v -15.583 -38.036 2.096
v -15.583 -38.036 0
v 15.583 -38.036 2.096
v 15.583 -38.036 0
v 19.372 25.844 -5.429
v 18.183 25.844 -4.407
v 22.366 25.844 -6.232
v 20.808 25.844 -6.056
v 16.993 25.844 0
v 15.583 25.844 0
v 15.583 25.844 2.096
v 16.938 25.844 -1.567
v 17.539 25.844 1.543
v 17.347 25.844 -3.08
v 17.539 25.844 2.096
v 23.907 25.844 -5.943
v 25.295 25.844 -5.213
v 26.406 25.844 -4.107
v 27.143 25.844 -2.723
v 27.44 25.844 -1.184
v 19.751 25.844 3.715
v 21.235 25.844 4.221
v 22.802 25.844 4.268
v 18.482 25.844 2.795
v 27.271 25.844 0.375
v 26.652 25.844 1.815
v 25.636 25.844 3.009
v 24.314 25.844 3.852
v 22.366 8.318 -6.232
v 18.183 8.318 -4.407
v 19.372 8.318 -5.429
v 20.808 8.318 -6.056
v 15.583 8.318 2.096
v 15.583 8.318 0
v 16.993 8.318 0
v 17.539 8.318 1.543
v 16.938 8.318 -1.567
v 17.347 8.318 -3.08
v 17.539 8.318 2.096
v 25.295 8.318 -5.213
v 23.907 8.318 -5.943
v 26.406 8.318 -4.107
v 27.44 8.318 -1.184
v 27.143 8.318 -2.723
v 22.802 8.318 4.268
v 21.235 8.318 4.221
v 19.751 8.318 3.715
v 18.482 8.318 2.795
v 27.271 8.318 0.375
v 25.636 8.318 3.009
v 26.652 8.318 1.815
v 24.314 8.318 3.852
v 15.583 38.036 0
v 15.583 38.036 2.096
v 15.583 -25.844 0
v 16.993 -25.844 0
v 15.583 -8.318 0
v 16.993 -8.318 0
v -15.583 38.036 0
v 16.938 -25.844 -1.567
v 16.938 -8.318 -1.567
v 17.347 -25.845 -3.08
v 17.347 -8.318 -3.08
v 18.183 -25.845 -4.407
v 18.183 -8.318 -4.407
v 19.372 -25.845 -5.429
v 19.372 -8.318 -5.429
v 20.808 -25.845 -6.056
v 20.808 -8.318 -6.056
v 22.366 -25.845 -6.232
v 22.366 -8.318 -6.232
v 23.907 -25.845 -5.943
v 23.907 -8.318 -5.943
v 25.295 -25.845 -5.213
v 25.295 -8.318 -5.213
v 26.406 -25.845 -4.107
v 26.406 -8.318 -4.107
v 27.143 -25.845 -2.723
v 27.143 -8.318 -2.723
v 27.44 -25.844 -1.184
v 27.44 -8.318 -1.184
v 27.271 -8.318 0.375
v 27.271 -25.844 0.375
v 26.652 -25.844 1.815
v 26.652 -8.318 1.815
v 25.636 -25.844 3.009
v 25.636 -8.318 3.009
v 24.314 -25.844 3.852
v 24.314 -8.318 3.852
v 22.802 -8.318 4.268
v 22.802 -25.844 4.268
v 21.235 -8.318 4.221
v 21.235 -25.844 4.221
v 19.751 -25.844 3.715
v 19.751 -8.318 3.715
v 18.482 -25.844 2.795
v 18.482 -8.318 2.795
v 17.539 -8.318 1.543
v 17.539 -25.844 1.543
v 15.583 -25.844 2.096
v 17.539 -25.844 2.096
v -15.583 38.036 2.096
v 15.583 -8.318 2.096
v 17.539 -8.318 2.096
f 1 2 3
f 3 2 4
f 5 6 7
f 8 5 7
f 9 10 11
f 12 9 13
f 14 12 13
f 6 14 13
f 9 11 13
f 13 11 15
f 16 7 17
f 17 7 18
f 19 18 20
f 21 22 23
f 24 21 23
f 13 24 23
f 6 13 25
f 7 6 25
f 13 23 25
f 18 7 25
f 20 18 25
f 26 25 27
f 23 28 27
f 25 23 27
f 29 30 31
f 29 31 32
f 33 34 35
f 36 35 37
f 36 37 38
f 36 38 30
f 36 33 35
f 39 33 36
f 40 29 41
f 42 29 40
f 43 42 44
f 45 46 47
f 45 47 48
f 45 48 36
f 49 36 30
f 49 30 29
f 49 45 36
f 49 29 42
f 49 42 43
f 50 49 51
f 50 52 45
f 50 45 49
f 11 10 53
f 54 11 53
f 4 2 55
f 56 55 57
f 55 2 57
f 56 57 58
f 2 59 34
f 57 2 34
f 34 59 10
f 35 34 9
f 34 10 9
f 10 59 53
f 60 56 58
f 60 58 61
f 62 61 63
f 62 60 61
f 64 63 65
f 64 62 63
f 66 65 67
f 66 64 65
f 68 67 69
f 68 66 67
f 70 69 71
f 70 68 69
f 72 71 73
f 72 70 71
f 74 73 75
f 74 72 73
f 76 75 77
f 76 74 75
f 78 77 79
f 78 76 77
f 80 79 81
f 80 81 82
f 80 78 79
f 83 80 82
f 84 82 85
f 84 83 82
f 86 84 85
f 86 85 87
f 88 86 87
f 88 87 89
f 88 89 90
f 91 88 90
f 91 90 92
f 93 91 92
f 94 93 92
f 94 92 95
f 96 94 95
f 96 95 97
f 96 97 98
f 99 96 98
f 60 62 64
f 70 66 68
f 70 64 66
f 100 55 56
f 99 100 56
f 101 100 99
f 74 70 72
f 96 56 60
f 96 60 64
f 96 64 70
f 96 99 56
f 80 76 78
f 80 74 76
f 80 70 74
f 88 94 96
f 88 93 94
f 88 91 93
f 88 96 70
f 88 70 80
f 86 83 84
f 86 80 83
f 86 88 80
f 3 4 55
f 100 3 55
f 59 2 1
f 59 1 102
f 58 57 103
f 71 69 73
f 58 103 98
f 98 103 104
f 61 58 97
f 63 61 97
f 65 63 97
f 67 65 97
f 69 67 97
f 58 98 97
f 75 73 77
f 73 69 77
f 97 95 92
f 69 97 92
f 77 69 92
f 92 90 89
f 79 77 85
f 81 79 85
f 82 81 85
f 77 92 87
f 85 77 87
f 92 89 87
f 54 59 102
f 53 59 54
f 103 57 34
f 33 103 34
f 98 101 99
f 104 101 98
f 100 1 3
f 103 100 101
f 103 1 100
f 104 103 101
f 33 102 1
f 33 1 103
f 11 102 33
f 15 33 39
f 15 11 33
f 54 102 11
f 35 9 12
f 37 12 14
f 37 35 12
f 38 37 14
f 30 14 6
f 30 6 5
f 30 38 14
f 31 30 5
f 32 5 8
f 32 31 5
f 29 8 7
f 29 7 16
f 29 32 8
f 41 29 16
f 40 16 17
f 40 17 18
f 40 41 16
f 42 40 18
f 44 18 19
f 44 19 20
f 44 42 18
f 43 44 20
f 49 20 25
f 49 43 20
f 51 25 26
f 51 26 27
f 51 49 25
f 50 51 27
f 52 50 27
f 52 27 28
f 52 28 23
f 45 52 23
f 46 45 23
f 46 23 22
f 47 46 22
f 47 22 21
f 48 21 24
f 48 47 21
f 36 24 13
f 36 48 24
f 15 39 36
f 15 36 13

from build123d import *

# Parameters (mm, degrees)
F0_W     = 31.1658
F0_H     = 76.073
F1_DEPTH = 2.0955
F2_W     = 17.526
F2_H     = 2.0955
F3_DEPTH = 1.9558
F4_R     = 5.2705
F5_DEPTH = 17.526
F7_DEPTH = 17.526


with BuildPart() as f1:
    # F0 (on Top) → F1 (new body)
    with BuildSketch(Plane.XY):
        Rectangle(F0_W, F0_H)
    extrude(amount=F1_DEPTH)

    # F2 (on face) → F3 (join)
    with BuildSketch(Plane.YZ.offset(15.5829)):
        with Locations((-17.0815, 1.04775)):
            Rectangle(F2_W, F2_H)
        with Locations((17.0815, 1.04775)):
            Rectangle(F2_W, F2_H)
    extrude(amount=F3_DEPTH)

    # F4 (on face) → F5 (join, through all)
    with BuildSketch(Plane.XZ.offset(25.8445)):
        with Locations((22.1742, -0.9652)):
            Circle(F4_R)
    extrude(amount=-F5_DEPTH)

    # F6 (on face) → F7 (join, through all)
    with BuildSketch(Plane.XZ.offset(-8.3185)):
        with BuildLine():
            Line((17.5387, 0), (16.992833, 0))
            ThreePointArc((16.992833, 0), (27.142883, -2.723141), (17.5387, 1.542849))
            Line((17.5387, 1.542849), (17.5387, 0))
        make_face()
    extrude(amount=-F7_DEPTH)


solid = f1.part
